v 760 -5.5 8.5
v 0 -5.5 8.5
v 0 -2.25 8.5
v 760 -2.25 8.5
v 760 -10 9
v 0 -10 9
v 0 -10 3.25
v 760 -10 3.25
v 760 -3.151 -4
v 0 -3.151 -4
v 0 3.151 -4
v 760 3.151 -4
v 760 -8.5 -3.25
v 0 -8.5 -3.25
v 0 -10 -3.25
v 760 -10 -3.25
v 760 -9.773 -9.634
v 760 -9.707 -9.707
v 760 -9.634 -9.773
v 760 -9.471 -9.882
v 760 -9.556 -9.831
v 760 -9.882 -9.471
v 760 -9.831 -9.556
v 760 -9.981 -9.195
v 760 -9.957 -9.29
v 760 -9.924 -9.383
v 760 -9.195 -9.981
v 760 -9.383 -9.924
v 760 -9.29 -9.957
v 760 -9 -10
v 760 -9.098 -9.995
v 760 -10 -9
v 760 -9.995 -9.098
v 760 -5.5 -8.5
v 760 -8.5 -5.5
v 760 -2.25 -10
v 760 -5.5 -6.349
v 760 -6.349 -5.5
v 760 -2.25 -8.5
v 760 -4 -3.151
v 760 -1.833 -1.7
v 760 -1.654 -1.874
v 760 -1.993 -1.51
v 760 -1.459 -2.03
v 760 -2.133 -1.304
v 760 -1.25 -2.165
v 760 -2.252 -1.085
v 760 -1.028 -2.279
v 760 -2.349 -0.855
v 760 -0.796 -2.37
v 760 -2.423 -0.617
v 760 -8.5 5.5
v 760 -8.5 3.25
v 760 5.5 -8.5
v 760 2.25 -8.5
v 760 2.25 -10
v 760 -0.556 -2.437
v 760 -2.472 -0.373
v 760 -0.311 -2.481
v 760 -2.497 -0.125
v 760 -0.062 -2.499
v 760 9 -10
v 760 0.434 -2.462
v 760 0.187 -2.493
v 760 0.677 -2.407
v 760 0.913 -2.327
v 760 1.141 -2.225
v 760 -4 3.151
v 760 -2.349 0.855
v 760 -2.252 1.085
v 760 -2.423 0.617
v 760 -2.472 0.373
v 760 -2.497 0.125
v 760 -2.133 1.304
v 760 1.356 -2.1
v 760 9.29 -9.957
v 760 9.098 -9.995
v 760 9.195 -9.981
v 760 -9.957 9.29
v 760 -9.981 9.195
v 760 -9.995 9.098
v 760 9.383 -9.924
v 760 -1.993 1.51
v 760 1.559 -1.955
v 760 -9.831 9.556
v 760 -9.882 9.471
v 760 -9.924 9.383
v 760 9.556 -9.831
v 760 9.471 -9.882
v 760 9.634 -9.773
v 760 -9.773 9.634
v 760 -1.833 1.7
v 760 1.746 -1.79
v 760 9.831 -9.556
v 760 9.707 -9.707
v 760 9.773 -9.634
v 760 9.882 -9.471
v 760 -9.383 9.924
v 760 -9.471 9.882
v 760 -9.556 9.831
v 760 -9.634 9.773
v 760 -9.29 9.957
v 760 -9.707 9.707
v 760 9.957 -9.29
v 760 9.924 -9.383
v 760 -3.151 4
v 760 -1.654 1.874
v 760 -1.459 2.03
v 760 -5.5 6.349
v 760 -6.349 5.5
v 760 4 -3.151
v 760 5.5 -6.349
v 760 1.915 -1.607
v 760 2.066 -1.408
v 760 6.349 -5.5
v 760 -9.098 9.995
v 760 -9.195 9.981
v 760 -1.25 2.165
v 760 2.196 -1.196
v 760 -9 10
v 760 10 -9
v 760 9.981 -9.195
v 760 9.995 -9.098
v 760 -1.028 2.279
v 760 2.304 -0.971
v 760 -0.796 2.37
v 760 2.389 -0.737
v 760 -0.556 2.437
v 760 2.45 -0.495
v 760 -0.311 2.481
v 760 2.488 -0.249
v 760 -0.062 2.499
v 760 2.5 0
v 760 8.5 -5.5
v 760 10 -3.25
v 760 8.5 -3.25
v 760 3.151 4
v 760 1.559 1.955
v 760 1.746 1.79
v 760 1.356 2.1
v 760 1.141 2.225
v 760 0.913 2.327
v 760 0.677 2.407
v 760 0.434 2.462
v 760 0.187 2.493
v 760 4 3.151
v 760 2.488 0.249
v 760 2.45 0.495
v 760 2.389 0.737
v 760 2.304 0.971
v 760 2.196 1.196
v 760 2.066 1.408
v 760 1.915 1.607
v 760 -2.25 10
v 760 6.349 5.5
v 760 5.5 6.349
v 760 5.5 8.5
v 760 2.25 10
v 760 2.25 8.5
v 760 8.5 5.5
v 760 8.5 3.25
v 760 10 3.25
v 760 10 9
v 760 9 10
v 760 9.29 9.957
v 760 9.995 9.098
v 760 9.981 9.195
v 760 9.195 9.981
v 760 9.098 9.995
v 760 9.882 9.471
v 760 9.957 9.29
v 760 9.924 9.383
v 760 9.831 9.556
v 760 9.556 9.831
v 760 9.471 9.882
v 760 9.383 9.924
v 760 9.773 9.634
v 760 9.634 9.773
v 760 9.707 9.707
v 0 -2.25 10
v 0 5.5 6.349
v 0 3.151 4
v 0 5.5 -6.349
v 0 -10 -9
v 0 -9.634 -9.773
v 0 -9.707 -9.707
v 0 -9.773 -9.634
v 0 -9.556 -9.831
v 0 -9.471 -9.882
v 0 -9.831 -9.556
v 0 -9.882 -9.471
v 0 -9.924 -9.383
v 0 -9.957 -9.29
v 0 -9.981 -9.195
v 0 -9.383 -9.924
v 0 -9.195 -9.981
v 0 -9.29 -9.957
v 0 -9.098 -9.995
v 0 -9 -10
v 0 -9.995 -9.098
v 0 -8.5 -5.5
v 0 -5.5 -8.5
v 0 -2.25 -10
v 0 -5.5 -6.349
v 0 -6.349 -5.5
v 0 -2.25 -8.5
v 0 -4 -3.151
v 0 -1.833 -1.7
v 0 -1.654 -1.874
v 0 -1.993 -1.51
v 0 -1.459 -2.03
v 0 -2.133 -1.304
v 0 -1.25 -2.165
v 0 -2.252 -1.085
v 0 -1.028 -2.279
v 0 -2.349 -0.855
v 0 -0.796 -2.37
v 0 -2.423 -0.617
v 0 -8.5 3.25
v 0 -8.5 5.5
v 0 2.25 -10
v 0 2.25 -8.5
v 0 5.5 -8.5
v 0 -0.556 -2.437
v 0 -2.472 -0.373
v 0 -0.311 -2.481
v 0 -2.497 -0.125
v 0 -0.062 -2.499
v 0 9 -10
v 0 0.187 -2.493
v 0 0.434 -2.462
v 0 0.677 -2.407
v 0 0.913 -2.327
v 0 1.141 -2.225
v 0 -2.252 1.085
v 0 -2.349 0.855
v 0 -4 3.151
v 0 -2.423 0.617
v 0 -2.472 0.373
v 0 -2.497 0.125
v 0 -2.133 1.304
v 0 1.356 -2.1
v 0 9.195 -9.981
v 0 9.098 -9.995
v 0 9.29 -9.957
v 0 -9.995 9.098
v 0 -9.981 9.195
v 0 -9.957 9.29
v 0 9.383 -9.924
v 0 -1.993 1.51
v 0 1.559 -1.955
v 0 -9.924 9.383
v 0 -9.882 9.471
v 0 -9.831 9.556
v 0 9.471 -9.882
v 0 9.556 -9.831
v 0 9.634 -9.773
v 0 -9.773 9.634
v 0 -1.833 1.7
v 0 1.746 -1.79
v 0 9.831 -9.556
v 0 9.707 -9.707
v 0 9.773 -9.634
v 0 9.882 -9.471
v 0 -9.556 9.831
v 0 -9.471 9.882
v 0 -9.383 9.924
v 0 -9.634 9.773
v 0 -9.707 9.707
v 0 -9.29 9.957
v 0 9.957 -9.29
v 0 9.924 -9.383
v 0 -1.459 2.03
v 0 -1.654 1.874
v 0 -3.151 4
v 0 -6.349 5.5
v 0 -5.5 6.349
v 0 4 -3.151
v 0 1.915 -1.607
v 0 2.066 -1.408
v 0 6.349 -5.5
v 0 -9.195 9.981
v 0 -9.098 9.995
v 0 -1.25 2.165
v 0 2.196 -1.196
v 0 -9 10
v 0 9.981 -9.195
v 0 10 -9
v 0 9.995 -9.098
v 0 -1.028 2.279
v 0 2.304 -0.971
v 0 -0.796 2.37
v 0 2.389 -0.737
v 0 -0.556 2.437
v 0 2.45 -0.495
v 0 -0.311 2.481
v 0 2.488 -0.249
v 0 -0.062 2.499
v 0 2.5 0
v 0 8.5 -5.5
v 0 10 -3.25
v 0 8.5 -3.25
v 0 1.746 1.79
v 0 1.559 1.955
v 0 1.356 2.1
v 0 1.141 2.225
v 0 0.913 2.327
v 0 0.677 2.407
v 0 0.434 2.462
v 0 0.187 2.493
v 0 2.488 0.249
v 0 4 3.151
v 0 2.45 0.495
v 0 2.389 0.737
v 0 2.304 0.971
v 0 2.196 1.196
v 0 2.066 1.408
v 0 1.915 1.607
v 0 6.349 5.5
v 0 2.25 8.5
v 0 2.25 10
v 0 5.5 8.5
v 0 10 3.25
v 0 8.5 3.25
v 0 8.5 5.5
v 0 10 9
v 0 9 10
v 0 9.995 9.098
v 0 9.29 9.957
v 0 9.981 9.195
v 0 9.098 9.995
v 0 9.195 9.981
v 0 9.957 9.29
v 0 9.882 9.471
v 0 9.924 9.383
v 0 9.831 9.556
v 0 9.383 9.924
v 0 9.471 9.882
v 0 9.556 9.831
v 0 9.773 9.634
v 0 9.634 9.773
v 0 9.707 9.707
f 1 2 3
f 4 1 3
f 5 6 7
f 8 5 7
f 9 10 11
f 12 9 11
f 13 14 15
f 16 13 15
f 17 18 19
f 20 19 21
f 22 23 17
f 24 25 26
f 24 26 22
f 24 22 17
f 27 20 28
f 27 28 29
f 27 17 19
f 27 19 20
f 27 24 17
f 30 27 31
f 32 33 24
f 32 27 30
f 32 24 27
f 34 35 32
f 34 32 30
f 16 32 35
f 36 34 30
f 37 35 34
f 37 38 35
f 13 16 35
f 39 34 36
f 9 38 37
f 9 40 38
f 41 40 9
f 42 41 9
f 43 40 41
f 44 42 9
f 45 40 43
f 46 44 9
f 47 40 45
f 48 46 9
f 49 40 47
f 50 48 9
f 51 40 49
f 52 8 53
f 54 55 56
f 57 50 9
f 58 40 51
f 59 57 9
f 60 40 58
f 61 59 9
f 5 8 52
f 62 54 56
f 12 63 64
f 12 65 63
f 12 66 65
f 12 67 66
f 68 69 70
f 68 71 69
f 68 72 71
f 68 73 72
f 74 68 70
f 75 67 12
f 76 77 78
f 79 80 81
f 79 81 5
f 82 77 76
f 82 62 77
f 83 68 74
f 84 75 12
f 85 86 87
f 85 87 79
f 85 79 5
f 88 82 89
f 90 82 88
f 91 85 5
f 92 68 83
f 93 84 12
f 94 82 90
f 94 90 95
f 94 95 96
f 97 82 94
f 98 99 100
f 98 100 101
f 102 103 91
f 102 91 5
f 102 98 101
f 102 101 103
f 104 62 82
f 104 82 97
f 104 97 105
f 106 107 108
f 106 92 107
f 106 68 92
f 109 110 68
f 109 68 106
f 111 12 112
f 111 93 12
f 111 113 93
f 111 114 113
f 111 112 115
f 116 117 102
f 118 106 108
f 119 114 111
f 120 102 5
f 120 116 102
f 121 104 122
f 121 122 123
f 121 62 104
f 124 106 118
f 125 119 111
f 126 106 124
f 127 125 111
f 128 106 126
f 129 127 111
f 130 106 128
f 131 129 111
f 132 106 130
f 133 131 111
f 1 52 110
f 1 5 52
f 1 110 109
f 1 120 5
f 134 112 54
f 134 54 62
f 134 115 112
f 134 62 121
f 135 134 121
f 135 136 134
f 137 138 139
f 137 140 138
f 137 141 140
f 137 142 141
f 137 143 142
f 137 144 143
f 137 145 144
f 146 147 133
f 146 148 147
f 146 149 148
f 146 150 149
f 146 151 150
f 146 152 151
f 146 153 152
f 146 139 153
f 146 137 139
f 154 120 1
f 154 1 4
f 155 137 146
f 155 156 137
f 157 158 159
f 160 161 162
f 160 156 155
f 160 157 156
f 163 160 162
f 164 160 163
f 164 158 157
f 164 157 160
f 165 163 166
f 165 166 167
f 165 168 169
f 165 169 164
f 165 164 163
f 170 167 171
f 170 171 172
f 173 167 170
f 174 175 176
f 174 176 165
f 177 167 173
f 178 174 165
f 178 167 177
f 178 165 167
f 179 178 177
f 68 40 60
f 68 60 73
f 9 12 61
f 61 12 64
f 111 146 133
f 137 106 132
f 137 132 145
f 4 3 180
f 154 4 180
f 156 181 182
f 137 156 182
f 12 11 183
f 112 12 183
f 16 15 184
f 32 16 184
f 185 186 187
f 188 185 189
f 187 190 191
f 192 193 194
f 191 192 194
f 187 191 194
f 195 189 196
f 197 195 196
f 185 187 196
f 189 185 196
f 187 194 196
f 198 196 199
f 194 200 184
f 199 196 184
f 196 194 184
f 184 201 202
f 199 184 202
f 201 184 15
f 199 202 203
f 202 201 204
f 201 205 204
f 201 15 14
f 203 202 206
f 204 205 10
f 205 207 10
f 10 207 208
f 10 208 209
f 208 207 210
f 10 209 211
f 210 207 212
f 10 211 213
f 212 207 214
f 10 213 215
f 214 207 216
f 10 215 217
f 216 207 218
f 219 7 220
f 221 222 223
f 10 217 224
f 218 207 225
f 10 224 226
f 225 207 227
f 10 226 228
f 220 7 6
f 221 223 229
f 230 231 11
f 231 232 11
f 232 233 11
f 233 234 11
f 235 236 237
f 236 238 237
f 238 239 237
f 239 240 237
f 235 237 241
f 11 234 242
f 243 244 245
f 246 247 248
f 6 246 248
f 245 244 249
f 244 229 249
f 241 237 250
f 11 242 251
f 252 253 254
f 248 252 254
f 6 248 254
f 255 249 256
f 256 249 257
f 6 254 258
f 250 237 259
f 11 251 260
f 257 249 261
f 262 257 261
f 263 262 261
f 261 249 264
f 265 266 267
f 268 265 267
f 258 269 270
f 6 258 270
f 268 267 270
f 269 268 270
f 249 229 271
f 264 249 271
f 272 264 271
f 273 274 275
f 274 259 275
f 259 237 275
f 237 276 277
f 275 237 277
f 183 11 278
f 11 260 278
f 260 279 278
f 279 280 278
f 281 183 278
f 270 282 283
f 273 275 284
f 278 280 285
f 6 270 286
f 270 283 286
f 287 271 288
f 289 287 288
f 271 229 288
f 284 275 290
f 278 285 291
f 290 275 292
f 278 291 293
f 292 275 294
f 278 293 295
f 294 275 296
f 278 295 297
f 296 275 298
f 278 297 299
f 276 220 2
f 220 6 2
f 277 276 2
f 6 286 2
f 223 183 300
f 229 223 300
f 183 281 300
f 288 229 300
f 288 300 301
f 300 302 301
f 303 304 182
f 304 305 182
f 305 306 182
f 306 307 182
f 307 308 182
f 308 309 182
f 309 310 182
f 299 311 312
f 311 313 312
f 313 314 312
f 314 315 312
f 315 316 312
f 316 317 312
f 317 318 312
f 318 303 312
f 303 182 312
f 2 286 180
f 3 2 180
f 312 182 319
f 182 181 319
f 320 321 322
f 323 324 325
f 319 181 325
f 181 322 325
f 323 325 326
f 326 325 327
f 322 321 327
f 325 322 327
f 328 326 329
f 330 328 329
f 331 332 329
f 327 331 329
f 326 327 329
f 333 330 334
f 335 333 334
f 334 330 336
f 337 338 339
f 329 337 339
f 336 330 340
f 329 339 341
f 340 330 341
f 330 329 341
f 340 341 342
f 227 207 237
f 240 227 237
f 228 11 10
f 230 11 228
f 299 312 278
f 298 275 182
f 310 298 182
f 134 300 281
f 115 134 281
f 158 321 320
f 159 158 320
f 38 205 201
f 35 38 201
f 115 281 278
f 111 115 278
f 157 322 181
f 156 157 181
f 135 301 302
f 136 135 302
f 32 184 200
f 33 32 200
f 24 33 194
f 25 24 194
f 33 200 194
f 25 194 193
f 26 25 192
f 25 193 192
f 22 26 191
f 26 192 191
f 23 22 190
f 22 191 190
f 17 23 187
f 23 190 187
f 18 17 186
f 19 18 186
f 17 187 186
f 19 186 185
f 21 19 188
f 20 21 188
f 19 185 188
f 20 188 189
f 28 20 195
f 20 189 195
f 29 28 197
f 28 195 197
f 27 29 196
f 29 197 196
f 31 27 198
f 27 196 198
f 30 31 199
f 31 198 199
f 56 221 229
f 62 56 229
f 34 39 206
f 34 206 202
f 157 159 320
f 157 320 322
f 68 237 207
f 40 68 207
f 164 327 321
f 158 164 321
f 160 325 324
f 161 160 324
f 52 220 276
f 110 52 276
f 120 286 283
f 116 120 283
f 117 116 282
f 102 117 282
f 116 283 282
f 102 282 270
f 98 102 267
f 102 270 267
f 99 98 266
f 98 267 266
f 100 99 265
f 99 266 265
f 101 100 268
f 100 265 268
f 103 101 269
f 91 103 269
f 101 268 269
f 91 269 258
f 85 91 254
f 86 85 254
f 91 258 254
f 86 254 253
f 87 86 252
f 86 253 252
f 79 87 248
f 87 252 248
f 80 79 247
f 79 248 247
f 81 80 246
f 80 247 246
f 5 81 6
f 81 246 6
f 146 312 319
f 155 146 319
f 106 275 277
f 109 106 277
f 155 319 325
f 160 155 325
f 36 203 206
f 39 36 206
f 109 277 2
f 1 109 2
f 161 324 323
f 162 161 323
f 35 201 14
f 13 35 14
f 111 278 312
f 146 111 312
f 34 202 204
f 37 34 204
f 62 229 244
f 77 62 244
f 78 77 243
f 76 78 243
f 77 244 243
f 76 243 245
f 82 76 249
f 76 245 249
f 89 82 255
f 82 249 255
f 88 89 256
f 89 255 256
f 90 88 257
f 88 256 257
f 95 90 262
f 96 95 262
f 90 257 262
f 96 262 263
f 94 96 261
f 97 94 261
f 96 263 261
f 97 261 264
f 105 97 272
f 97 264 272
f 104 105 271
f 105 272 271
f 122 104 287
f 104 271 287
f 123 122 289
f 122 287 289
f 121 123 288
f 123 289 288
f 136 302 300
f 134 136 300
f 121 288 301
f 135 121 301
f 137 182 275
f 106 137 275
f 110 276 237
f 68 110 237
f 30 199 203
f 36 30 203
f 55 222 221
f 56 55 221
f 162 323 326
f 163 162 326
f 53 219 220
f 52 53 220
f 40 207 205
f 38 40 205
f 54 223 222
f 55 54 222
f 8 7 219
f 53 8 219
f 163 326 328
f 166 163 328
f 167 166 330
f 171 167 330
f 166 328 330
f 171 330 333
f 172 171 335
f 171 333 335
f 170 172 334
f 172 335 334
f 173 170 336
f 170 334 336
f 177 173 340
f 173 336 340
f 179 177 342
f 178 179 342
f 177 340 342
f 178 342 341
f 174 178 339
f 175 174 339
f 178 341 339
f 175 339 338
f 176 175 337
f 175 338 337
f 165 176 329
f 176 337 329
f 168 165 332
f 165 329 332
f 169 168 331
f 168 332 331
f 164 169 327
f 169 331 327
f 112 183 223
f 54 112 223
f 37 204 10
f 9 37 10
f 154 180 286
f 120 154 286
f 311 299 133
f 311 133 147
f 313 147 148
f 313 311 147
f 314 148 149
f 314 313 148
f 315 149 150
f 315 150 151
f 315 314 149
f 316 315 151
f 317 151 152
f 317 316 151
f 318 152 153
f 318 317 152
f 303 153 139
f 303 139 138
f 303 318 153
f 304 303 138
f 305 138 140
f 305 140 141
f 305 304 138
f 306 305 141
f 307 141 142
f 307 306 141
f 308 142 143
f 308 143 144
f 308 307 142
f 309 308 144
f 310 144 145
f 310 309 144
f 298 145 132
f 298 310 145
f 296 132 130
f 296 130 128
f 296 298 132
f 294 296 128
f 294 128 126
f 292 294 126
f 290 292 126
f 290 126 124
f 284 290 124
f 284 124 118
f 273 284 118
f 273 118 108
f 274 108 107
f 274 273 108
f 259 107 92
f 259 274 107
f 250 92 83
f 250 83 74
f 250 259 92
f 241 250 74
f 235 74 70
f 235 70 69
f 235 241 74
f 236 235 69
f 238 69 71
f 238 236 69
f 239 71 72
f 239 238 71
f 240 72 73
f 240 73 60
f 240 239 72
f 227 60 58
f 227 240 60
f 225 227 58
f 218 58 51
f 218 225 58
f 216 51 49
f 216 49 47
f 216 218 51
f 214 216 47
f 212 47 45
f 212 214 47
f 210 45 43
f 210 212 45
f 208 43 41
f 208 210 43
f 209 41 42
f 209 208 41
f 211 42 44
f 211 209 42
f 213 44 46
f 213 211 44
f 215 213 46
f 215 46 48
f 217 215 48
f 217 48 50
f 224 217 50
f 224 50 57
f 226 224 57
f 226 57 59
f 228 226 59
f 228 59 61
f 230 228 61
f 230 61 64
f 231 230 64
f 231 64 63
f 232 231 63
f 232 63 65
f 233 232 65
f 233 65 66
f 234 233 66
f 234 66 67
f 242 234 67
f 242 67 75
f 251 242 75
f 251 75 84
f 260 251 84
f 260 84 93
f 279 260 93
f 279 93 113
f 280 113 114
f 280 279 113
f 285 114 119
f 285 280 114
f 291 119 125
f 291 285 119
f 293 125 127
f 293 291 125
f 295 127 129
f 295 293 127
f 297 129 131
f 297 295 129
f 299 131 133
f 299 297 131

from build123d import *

# Parameters (mm, degrees)
SKETCH_11_R           = 2.5
F_20_X_20_X_2_1_DEPTH = 760


with BuildPart() as part:
    # 草图11 → 铝型材 20 X 20 X 2(1) (new body)
    with BuildSketch(Plane.YZ):
        with BuildLine():
            Line((-10, 9), (-10, 3.25))
            Line((-10, 3.25), (-8.5, 3.25))
            Line((-8.5, 3.25), (-8.5, 5.5))
            Line((-8.5, 5.5), (-6.348528137, 5.5))
            Line((-6.348528137, 5.5), (-4, 3.151471863))
            Line((-4, 3.151471863), (-4, -3.151471863))
            Line((-4, -3.151471863), (-6.348528137, -5.5))
            Line((-6.348528137, -5.5), (-8.5, -5.5))
            Line((-8.5, -5.5), (-8.5, -3.25))
            Line((-8.5, -3.25), (-10, -3.25))
            Line((-10, -3.25), (-10, -9))
            ThreePointArc((-10, -9), (-9.707106781, -9.707106781), (-9, -10))
            Line((-9, -10), (-2.25, -10))
            Line((-2.25, -10), (-2.25, -8.5))
            Line((-2.25, -8.5), (-5.5, -8.5))
            Line((-5.5, -8.5), (-5.5, -6.348528137))
            Line((-5.5, -6.348528137), (-3.151471863, -4))
            Line((-3.151471863, -4), (3.151471863, -4))
            Line((3.151471863, -4), (5.5, -6.348528137))
            Line((5.5, -6.348528137), (5.5, -8.5))
            Line((5.5, -8.5), (2.25, -8.5))
            Line((2.25, -8.5), (2.25, -10))
            Line((2.25, -10), (9, -10))
            ThreePointArc((9, -10), (9.707106781, -9.707106781), (10, -9))
            Line((10, -9), (10, -3.25))
            Line((10, -3.25), (8.5, -3.25))
            Line((8.5, -3.25), (8.5, -5.5))
            Line((8.5, -5.5), (6.348528137, -5.5))
            Line((6.348528137, -5.5), (4, -3.151471863))
            Line((4, -3.151471863), (4, 3.151471863))
            Line((4, 3.151471863), (6.348528137, 5.5))
            Line((6.348528137, 5.5), (8.5, 5.5))
            Line((8.5, 5.5), (8.5, 3.25))
            Line((8.5, 3.25), (10, 3.25))
            Line((10, 3.25), (10, 9))
            ThreePointArc((10, 9), (9.707106781, 9.707106781), (9, 10))
            Line((9, 10), (2.25, 10))
            Line((2.25, 10), (2.25, 8.5))
            Line((2.25, 8.5), (5.5, 8.5))
            Line((5.5, 8.5), (5.5, 6.348528137))
            Line((5.5, 6.348528137), (3.151471863, 4))
            Line((3.151471863, 4), (-3.151471863, 4))
            Line((-3.151471863, 4), (-5.5, 6.348528137))
            Line((-5.5, 6.348528137), (-5.5, 8.5))
            Line((-5.5, 8.5), (-2.25, 8.5))
            Line((-2.25, 8.5), (-2.25, 10))
            Line((-2.25, 10), (-9, 10))
            ThreePointArc((-9, 10), (-9.707106781, 9.707106781), (-10, 9))
        make_face()
        Circle(SKETCH_11_R, mode=Mode.SUBTRACT)
    extrude(amount=F_20_X_20_X_2_1_DEPTH)


solid = part.part
